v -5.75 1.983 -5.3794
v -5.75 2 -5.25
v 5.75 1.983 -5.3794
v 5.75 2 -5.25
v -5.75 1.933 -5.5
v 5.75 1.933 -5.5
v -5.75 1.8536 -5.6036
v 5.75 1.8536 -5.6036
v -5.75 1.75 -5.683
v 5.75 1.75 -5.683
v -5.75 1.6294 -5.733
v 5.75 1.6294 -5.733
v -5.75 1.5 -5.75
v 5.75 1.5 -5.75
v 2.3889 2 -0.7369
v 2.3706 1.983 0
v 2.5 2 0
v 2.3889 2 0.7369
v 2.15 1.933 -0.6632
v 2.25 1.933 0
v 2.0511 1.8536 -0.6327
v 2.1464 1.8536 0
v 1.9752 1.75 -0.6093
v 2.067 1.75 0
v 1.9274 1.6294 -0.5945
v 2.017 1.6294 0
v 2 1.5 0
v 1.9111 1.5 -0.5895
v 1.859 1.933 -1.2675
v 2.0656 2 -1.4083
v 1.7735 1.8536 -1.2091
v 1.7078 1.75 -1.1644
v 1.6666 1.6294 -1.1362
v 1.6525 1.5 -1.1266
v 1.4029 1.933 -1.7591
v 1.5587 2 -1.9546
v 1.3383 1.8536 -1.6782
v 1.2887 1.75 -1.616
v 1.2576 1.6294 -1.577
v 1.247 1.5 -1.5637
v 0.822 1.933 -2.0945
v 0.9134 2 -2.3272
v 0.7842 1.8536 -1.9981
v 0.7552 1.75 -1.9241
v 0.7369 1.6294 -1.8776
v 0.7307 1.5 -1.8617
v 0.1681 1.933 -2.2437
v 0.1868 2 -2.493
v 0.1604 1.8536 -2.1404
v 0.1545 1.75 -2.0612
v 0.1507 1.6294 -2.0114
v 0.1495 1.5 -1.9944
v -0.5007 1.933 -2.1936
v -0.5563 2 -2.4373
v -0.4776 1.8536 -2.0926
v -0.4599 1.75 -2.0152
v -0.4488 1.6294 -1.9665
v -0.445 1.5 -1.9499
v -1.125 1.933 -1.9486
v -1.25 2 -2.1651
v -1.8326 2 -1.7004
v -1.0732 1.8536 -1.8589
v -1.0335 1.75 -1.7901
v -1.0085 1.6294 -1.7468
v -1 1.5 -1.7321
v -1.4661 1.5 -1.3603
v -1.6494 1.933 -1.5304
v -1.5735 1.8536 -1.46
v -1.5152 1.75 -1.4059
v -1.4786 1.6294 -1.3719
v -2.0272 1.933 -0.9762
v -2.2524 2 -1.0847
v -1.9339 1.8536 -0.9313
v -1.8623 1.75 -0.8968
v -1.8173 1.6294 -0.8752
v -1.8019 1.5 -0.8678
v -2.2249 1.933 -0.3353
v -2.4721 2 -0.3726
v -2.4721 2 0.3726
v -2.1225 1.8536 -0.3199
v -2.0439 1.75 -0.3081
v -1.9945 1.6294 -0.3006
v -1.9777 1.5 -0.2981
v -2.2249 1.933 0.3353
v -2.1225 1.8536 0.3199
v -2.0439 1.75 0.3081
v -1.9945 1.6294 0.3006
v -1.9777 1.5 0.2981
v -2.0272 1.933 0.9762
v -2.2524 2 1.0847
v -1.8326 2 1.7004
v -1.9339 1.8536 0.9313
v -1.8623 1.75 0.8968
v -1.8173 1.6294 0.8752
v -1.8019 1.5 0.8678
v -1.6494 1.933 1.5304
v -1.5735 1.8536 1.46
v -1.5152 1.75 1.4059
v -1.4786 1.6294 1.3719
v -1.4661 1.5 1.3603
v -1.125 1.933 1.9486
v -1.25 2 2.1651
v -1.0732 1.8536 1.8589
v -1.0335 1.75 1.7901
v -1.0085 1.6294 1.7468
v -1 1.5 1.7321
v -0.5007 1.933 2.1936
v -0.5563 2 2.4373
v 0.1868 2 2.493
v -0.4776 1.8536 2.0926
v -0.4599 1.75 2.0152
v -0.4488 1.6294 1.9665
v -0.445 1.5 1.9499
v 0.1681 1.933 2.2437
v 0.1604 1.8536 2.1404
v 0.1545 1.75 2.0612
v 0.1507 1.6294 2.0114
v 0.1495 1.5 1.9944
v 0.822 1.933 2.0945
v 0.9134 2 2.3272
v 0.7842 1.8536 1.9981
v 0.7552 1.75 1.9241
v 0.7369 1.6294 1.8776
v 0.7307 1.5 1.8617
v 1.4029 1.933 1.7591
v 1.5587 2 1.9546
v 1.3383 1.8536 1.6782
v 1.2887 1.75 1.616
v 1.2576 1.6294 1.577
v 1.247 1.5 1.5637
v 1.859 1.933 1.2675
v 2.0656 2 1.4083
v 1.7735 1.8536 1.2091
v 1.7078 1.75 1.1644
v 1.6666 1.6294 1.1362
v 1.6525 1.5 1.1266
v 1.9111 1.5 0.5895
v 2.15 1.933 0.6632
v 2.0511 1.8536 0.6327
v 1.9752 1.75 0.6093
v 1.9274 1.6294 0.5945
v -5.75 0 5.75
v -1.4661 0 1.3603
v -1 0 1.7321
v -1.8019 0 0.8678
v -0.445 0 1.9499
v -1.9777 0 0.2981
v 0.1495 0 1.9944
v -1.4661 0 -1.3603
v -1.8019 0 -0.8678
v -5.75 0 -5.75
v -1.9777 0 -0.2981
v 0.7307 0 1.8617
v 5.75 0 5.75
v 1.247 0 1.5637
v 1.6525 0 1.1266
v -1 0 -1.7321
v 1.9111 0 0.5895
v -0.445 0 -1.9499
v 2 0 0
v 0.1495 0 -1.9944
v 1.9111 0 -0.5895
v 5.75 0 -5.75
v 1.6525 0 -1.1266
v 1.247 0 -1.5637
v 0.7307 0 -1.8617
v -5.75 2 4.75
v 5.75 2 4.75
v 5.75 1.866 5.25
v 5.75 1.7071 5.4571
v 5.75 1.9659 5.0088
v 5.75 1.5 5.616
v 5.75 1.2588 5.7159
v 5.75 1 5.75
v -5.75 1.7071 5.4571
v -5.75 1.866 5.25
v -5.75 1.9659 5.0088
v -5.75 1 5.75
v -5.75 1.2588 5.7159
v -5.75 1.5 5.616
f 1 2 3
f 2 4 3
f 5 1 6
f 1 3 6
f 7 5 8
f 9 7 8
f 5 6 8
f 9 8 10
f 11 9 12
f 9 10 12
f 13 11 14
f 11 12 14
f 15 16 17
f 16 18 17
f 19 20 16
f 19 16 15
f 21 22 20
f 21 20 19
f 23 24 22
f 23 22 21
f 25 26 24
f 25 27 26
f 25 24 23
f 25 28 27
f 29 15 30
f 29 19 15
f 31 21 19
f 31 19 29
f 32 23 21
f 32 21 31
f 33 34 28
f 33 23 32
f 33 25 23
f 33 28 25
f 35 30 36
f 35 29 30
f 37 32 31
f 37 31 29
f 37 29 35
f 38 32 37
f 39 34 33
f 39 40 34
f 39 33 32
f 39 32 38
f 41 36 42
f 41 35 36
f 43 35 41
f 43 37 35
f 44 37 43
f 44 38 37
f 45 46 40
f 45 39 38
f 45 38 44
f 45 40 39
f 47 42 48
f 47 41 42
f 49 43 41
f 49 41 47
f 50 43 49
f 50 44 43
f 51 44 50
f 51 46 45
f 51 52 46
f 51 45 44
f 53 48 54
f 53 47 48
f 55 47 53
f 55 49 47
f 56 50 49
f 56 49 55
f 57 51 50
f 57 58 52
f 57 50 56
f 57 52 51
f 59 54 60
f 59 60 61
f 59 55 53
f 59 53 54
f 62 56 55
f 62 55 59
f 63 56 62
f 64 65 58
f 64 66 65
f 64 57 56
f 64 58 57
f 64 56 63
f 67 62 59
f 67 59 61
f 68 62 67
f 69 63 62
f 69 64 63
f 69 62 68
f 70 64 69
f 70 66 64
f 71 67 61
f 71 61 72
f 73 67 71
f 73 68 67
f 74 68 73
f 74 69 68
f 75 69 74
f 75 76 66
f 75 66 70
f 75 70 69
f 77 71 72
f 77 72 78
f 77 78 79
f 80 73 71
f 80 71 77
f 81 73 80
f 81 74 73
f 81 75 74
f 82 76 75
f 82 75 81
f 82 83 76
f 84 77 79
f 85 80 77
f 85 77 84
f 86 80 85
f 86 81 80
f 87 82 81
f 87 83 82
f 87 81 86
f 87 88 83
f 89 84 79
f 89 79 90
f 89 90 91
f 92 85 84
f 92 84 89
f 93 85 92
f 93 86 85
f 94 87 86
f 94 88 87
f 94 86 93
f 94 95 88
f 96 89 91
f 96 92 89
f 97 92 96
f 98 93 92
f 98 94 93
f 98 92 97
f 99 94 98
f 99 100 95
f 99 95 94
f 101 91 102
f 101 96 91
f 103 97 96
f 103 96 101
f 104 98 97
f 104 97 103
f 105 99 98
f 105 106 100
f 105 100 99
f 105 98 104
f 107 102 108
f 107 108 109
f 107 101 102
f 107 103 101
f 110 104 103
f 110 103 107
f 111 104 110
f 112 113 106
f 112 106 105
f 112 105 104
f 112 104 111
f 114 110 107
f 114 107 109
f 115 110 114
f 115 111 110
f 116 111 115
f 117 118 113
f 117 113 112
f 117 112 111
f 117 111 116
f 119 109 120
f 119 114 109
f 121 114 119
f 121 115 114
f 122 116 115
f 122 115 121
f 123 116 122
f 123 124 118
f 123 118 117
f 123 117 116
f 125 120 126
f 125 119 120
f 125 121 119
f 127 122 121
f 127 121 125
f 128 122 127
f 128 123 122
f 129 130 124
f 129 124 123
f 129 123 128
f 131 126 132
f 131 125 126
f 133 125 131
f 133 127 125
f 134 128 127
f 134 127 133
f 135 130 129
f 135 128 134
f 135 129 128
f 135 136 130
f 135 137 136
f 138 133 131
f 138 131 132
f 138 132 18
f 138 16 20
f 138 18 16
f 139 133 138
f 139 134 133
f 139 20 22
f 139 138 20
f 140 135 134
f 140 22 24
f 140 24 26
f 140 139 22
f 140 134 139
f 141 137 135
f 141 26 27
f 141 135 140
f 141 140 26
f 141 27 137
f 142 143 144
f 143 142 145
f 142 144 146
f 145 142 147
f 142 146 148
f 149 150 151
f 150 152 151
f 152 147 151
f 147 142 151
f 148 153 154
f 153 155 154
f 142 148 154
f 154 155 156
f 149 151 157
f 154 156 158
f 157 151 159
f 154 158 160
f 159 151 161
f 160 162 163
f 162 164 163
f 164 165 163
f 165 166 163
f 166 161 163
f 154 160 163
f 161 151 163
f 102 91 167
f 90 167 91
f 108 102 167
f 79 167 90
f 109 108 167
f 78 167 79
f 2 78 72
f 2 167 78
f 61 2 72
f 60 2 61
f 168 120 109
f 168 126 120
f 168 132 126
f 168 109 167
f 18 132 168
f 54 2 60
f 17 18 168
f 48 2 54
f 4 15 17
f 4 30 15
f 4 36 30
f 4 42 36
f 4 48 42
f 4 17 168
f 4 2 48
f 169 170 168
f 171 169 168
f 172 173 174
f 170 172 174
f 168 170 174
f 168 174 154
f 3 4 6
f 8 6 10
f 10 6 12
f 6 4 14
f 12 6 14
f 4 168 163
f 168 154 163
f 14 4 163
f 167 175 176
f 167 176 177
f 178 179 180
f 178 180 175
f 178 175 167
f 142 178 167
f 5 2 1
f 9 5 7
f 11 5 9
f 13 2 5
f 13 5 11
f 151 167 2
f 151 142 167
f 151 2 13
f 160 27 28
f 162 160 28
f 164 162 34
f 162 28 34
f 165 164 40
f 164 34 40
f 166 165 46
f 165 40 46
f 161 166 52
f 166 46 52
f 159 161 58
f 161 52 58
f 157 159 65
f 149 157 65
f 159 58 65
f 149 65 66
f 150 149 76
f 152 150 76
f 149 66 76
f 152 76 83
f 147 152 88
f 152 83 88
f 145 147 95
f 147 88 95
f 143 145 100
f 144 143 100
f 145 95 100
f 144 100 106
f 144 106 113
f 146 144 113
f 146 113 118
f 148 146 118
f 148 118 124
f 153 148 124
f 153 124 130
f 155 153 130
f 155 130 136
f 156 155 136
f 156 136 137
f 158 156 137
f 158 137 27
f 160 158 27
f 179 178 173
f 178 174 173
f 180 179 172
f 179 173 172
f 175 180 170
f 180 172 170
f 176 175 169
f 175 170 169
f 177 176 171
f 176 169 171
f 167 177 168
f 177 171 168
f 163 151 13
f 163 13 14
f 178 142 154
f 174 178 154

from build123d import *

# Parameters (mm, degrees)
SKETCH1_W           = 11.5
SKETCH1_H           = 11.5
BOSS_EXTRUDE1_DEPTH = 2
SKETCH2_R           = 2
CUT_EXTRUDE1_DEPTH  = 3
FILLET1_R           = 1
FILLET2_R           = 0.5
FILLET3_R           = 0.5


with BuildPart() as part:
    # Sketch1 → Boss-Extrude1 (new body)
    with BuildSketch(Plane(origin=(0, 0, 0), x_dir=(1, 0, 0), z_dir=(0, 1, 0))):
        Rectangle(SKETCH1_W, SKETCH1_H)
    extrude(amount=BOSS_EXTRUDE1_DEPTH)

    # Sketch2 → Cut-Extrude1 (cut, through all)
    with BuildSketch(Plane(origin=(0, 2, 0), x_dir=(1, 0, 0), z_dir=(0, 1, 0))):
        Circle(SKETCH2_R)
    extrude(amount=-CUT_EXTRUDE1_DEPTH, mode=Mode.SUBTRACT)

    # Fillet1
    fillet1_edges = [part.edges().sort_by_distance(p)[0] for p in [
        (0, 2, 5.75),
    ]]
    fillet(fillet1_edges, radius=FILLET1_R)

    # Fillet2
    fillet2_edges = [part.edges().sort_by_distance(p)[0] for p in [
        (0, 2, -5.75),
    ]]
    fillet(fillet2_edges, radius=FILLET2_R)

    # Fillet3
    fillet3_edges = [part.edges().sort_by_distance(p)[0] for p in [
        (-2, 2, 0),
    ]]
    fillet(fillet3_edges, radius=FILLET3_R)


solid = part.part
